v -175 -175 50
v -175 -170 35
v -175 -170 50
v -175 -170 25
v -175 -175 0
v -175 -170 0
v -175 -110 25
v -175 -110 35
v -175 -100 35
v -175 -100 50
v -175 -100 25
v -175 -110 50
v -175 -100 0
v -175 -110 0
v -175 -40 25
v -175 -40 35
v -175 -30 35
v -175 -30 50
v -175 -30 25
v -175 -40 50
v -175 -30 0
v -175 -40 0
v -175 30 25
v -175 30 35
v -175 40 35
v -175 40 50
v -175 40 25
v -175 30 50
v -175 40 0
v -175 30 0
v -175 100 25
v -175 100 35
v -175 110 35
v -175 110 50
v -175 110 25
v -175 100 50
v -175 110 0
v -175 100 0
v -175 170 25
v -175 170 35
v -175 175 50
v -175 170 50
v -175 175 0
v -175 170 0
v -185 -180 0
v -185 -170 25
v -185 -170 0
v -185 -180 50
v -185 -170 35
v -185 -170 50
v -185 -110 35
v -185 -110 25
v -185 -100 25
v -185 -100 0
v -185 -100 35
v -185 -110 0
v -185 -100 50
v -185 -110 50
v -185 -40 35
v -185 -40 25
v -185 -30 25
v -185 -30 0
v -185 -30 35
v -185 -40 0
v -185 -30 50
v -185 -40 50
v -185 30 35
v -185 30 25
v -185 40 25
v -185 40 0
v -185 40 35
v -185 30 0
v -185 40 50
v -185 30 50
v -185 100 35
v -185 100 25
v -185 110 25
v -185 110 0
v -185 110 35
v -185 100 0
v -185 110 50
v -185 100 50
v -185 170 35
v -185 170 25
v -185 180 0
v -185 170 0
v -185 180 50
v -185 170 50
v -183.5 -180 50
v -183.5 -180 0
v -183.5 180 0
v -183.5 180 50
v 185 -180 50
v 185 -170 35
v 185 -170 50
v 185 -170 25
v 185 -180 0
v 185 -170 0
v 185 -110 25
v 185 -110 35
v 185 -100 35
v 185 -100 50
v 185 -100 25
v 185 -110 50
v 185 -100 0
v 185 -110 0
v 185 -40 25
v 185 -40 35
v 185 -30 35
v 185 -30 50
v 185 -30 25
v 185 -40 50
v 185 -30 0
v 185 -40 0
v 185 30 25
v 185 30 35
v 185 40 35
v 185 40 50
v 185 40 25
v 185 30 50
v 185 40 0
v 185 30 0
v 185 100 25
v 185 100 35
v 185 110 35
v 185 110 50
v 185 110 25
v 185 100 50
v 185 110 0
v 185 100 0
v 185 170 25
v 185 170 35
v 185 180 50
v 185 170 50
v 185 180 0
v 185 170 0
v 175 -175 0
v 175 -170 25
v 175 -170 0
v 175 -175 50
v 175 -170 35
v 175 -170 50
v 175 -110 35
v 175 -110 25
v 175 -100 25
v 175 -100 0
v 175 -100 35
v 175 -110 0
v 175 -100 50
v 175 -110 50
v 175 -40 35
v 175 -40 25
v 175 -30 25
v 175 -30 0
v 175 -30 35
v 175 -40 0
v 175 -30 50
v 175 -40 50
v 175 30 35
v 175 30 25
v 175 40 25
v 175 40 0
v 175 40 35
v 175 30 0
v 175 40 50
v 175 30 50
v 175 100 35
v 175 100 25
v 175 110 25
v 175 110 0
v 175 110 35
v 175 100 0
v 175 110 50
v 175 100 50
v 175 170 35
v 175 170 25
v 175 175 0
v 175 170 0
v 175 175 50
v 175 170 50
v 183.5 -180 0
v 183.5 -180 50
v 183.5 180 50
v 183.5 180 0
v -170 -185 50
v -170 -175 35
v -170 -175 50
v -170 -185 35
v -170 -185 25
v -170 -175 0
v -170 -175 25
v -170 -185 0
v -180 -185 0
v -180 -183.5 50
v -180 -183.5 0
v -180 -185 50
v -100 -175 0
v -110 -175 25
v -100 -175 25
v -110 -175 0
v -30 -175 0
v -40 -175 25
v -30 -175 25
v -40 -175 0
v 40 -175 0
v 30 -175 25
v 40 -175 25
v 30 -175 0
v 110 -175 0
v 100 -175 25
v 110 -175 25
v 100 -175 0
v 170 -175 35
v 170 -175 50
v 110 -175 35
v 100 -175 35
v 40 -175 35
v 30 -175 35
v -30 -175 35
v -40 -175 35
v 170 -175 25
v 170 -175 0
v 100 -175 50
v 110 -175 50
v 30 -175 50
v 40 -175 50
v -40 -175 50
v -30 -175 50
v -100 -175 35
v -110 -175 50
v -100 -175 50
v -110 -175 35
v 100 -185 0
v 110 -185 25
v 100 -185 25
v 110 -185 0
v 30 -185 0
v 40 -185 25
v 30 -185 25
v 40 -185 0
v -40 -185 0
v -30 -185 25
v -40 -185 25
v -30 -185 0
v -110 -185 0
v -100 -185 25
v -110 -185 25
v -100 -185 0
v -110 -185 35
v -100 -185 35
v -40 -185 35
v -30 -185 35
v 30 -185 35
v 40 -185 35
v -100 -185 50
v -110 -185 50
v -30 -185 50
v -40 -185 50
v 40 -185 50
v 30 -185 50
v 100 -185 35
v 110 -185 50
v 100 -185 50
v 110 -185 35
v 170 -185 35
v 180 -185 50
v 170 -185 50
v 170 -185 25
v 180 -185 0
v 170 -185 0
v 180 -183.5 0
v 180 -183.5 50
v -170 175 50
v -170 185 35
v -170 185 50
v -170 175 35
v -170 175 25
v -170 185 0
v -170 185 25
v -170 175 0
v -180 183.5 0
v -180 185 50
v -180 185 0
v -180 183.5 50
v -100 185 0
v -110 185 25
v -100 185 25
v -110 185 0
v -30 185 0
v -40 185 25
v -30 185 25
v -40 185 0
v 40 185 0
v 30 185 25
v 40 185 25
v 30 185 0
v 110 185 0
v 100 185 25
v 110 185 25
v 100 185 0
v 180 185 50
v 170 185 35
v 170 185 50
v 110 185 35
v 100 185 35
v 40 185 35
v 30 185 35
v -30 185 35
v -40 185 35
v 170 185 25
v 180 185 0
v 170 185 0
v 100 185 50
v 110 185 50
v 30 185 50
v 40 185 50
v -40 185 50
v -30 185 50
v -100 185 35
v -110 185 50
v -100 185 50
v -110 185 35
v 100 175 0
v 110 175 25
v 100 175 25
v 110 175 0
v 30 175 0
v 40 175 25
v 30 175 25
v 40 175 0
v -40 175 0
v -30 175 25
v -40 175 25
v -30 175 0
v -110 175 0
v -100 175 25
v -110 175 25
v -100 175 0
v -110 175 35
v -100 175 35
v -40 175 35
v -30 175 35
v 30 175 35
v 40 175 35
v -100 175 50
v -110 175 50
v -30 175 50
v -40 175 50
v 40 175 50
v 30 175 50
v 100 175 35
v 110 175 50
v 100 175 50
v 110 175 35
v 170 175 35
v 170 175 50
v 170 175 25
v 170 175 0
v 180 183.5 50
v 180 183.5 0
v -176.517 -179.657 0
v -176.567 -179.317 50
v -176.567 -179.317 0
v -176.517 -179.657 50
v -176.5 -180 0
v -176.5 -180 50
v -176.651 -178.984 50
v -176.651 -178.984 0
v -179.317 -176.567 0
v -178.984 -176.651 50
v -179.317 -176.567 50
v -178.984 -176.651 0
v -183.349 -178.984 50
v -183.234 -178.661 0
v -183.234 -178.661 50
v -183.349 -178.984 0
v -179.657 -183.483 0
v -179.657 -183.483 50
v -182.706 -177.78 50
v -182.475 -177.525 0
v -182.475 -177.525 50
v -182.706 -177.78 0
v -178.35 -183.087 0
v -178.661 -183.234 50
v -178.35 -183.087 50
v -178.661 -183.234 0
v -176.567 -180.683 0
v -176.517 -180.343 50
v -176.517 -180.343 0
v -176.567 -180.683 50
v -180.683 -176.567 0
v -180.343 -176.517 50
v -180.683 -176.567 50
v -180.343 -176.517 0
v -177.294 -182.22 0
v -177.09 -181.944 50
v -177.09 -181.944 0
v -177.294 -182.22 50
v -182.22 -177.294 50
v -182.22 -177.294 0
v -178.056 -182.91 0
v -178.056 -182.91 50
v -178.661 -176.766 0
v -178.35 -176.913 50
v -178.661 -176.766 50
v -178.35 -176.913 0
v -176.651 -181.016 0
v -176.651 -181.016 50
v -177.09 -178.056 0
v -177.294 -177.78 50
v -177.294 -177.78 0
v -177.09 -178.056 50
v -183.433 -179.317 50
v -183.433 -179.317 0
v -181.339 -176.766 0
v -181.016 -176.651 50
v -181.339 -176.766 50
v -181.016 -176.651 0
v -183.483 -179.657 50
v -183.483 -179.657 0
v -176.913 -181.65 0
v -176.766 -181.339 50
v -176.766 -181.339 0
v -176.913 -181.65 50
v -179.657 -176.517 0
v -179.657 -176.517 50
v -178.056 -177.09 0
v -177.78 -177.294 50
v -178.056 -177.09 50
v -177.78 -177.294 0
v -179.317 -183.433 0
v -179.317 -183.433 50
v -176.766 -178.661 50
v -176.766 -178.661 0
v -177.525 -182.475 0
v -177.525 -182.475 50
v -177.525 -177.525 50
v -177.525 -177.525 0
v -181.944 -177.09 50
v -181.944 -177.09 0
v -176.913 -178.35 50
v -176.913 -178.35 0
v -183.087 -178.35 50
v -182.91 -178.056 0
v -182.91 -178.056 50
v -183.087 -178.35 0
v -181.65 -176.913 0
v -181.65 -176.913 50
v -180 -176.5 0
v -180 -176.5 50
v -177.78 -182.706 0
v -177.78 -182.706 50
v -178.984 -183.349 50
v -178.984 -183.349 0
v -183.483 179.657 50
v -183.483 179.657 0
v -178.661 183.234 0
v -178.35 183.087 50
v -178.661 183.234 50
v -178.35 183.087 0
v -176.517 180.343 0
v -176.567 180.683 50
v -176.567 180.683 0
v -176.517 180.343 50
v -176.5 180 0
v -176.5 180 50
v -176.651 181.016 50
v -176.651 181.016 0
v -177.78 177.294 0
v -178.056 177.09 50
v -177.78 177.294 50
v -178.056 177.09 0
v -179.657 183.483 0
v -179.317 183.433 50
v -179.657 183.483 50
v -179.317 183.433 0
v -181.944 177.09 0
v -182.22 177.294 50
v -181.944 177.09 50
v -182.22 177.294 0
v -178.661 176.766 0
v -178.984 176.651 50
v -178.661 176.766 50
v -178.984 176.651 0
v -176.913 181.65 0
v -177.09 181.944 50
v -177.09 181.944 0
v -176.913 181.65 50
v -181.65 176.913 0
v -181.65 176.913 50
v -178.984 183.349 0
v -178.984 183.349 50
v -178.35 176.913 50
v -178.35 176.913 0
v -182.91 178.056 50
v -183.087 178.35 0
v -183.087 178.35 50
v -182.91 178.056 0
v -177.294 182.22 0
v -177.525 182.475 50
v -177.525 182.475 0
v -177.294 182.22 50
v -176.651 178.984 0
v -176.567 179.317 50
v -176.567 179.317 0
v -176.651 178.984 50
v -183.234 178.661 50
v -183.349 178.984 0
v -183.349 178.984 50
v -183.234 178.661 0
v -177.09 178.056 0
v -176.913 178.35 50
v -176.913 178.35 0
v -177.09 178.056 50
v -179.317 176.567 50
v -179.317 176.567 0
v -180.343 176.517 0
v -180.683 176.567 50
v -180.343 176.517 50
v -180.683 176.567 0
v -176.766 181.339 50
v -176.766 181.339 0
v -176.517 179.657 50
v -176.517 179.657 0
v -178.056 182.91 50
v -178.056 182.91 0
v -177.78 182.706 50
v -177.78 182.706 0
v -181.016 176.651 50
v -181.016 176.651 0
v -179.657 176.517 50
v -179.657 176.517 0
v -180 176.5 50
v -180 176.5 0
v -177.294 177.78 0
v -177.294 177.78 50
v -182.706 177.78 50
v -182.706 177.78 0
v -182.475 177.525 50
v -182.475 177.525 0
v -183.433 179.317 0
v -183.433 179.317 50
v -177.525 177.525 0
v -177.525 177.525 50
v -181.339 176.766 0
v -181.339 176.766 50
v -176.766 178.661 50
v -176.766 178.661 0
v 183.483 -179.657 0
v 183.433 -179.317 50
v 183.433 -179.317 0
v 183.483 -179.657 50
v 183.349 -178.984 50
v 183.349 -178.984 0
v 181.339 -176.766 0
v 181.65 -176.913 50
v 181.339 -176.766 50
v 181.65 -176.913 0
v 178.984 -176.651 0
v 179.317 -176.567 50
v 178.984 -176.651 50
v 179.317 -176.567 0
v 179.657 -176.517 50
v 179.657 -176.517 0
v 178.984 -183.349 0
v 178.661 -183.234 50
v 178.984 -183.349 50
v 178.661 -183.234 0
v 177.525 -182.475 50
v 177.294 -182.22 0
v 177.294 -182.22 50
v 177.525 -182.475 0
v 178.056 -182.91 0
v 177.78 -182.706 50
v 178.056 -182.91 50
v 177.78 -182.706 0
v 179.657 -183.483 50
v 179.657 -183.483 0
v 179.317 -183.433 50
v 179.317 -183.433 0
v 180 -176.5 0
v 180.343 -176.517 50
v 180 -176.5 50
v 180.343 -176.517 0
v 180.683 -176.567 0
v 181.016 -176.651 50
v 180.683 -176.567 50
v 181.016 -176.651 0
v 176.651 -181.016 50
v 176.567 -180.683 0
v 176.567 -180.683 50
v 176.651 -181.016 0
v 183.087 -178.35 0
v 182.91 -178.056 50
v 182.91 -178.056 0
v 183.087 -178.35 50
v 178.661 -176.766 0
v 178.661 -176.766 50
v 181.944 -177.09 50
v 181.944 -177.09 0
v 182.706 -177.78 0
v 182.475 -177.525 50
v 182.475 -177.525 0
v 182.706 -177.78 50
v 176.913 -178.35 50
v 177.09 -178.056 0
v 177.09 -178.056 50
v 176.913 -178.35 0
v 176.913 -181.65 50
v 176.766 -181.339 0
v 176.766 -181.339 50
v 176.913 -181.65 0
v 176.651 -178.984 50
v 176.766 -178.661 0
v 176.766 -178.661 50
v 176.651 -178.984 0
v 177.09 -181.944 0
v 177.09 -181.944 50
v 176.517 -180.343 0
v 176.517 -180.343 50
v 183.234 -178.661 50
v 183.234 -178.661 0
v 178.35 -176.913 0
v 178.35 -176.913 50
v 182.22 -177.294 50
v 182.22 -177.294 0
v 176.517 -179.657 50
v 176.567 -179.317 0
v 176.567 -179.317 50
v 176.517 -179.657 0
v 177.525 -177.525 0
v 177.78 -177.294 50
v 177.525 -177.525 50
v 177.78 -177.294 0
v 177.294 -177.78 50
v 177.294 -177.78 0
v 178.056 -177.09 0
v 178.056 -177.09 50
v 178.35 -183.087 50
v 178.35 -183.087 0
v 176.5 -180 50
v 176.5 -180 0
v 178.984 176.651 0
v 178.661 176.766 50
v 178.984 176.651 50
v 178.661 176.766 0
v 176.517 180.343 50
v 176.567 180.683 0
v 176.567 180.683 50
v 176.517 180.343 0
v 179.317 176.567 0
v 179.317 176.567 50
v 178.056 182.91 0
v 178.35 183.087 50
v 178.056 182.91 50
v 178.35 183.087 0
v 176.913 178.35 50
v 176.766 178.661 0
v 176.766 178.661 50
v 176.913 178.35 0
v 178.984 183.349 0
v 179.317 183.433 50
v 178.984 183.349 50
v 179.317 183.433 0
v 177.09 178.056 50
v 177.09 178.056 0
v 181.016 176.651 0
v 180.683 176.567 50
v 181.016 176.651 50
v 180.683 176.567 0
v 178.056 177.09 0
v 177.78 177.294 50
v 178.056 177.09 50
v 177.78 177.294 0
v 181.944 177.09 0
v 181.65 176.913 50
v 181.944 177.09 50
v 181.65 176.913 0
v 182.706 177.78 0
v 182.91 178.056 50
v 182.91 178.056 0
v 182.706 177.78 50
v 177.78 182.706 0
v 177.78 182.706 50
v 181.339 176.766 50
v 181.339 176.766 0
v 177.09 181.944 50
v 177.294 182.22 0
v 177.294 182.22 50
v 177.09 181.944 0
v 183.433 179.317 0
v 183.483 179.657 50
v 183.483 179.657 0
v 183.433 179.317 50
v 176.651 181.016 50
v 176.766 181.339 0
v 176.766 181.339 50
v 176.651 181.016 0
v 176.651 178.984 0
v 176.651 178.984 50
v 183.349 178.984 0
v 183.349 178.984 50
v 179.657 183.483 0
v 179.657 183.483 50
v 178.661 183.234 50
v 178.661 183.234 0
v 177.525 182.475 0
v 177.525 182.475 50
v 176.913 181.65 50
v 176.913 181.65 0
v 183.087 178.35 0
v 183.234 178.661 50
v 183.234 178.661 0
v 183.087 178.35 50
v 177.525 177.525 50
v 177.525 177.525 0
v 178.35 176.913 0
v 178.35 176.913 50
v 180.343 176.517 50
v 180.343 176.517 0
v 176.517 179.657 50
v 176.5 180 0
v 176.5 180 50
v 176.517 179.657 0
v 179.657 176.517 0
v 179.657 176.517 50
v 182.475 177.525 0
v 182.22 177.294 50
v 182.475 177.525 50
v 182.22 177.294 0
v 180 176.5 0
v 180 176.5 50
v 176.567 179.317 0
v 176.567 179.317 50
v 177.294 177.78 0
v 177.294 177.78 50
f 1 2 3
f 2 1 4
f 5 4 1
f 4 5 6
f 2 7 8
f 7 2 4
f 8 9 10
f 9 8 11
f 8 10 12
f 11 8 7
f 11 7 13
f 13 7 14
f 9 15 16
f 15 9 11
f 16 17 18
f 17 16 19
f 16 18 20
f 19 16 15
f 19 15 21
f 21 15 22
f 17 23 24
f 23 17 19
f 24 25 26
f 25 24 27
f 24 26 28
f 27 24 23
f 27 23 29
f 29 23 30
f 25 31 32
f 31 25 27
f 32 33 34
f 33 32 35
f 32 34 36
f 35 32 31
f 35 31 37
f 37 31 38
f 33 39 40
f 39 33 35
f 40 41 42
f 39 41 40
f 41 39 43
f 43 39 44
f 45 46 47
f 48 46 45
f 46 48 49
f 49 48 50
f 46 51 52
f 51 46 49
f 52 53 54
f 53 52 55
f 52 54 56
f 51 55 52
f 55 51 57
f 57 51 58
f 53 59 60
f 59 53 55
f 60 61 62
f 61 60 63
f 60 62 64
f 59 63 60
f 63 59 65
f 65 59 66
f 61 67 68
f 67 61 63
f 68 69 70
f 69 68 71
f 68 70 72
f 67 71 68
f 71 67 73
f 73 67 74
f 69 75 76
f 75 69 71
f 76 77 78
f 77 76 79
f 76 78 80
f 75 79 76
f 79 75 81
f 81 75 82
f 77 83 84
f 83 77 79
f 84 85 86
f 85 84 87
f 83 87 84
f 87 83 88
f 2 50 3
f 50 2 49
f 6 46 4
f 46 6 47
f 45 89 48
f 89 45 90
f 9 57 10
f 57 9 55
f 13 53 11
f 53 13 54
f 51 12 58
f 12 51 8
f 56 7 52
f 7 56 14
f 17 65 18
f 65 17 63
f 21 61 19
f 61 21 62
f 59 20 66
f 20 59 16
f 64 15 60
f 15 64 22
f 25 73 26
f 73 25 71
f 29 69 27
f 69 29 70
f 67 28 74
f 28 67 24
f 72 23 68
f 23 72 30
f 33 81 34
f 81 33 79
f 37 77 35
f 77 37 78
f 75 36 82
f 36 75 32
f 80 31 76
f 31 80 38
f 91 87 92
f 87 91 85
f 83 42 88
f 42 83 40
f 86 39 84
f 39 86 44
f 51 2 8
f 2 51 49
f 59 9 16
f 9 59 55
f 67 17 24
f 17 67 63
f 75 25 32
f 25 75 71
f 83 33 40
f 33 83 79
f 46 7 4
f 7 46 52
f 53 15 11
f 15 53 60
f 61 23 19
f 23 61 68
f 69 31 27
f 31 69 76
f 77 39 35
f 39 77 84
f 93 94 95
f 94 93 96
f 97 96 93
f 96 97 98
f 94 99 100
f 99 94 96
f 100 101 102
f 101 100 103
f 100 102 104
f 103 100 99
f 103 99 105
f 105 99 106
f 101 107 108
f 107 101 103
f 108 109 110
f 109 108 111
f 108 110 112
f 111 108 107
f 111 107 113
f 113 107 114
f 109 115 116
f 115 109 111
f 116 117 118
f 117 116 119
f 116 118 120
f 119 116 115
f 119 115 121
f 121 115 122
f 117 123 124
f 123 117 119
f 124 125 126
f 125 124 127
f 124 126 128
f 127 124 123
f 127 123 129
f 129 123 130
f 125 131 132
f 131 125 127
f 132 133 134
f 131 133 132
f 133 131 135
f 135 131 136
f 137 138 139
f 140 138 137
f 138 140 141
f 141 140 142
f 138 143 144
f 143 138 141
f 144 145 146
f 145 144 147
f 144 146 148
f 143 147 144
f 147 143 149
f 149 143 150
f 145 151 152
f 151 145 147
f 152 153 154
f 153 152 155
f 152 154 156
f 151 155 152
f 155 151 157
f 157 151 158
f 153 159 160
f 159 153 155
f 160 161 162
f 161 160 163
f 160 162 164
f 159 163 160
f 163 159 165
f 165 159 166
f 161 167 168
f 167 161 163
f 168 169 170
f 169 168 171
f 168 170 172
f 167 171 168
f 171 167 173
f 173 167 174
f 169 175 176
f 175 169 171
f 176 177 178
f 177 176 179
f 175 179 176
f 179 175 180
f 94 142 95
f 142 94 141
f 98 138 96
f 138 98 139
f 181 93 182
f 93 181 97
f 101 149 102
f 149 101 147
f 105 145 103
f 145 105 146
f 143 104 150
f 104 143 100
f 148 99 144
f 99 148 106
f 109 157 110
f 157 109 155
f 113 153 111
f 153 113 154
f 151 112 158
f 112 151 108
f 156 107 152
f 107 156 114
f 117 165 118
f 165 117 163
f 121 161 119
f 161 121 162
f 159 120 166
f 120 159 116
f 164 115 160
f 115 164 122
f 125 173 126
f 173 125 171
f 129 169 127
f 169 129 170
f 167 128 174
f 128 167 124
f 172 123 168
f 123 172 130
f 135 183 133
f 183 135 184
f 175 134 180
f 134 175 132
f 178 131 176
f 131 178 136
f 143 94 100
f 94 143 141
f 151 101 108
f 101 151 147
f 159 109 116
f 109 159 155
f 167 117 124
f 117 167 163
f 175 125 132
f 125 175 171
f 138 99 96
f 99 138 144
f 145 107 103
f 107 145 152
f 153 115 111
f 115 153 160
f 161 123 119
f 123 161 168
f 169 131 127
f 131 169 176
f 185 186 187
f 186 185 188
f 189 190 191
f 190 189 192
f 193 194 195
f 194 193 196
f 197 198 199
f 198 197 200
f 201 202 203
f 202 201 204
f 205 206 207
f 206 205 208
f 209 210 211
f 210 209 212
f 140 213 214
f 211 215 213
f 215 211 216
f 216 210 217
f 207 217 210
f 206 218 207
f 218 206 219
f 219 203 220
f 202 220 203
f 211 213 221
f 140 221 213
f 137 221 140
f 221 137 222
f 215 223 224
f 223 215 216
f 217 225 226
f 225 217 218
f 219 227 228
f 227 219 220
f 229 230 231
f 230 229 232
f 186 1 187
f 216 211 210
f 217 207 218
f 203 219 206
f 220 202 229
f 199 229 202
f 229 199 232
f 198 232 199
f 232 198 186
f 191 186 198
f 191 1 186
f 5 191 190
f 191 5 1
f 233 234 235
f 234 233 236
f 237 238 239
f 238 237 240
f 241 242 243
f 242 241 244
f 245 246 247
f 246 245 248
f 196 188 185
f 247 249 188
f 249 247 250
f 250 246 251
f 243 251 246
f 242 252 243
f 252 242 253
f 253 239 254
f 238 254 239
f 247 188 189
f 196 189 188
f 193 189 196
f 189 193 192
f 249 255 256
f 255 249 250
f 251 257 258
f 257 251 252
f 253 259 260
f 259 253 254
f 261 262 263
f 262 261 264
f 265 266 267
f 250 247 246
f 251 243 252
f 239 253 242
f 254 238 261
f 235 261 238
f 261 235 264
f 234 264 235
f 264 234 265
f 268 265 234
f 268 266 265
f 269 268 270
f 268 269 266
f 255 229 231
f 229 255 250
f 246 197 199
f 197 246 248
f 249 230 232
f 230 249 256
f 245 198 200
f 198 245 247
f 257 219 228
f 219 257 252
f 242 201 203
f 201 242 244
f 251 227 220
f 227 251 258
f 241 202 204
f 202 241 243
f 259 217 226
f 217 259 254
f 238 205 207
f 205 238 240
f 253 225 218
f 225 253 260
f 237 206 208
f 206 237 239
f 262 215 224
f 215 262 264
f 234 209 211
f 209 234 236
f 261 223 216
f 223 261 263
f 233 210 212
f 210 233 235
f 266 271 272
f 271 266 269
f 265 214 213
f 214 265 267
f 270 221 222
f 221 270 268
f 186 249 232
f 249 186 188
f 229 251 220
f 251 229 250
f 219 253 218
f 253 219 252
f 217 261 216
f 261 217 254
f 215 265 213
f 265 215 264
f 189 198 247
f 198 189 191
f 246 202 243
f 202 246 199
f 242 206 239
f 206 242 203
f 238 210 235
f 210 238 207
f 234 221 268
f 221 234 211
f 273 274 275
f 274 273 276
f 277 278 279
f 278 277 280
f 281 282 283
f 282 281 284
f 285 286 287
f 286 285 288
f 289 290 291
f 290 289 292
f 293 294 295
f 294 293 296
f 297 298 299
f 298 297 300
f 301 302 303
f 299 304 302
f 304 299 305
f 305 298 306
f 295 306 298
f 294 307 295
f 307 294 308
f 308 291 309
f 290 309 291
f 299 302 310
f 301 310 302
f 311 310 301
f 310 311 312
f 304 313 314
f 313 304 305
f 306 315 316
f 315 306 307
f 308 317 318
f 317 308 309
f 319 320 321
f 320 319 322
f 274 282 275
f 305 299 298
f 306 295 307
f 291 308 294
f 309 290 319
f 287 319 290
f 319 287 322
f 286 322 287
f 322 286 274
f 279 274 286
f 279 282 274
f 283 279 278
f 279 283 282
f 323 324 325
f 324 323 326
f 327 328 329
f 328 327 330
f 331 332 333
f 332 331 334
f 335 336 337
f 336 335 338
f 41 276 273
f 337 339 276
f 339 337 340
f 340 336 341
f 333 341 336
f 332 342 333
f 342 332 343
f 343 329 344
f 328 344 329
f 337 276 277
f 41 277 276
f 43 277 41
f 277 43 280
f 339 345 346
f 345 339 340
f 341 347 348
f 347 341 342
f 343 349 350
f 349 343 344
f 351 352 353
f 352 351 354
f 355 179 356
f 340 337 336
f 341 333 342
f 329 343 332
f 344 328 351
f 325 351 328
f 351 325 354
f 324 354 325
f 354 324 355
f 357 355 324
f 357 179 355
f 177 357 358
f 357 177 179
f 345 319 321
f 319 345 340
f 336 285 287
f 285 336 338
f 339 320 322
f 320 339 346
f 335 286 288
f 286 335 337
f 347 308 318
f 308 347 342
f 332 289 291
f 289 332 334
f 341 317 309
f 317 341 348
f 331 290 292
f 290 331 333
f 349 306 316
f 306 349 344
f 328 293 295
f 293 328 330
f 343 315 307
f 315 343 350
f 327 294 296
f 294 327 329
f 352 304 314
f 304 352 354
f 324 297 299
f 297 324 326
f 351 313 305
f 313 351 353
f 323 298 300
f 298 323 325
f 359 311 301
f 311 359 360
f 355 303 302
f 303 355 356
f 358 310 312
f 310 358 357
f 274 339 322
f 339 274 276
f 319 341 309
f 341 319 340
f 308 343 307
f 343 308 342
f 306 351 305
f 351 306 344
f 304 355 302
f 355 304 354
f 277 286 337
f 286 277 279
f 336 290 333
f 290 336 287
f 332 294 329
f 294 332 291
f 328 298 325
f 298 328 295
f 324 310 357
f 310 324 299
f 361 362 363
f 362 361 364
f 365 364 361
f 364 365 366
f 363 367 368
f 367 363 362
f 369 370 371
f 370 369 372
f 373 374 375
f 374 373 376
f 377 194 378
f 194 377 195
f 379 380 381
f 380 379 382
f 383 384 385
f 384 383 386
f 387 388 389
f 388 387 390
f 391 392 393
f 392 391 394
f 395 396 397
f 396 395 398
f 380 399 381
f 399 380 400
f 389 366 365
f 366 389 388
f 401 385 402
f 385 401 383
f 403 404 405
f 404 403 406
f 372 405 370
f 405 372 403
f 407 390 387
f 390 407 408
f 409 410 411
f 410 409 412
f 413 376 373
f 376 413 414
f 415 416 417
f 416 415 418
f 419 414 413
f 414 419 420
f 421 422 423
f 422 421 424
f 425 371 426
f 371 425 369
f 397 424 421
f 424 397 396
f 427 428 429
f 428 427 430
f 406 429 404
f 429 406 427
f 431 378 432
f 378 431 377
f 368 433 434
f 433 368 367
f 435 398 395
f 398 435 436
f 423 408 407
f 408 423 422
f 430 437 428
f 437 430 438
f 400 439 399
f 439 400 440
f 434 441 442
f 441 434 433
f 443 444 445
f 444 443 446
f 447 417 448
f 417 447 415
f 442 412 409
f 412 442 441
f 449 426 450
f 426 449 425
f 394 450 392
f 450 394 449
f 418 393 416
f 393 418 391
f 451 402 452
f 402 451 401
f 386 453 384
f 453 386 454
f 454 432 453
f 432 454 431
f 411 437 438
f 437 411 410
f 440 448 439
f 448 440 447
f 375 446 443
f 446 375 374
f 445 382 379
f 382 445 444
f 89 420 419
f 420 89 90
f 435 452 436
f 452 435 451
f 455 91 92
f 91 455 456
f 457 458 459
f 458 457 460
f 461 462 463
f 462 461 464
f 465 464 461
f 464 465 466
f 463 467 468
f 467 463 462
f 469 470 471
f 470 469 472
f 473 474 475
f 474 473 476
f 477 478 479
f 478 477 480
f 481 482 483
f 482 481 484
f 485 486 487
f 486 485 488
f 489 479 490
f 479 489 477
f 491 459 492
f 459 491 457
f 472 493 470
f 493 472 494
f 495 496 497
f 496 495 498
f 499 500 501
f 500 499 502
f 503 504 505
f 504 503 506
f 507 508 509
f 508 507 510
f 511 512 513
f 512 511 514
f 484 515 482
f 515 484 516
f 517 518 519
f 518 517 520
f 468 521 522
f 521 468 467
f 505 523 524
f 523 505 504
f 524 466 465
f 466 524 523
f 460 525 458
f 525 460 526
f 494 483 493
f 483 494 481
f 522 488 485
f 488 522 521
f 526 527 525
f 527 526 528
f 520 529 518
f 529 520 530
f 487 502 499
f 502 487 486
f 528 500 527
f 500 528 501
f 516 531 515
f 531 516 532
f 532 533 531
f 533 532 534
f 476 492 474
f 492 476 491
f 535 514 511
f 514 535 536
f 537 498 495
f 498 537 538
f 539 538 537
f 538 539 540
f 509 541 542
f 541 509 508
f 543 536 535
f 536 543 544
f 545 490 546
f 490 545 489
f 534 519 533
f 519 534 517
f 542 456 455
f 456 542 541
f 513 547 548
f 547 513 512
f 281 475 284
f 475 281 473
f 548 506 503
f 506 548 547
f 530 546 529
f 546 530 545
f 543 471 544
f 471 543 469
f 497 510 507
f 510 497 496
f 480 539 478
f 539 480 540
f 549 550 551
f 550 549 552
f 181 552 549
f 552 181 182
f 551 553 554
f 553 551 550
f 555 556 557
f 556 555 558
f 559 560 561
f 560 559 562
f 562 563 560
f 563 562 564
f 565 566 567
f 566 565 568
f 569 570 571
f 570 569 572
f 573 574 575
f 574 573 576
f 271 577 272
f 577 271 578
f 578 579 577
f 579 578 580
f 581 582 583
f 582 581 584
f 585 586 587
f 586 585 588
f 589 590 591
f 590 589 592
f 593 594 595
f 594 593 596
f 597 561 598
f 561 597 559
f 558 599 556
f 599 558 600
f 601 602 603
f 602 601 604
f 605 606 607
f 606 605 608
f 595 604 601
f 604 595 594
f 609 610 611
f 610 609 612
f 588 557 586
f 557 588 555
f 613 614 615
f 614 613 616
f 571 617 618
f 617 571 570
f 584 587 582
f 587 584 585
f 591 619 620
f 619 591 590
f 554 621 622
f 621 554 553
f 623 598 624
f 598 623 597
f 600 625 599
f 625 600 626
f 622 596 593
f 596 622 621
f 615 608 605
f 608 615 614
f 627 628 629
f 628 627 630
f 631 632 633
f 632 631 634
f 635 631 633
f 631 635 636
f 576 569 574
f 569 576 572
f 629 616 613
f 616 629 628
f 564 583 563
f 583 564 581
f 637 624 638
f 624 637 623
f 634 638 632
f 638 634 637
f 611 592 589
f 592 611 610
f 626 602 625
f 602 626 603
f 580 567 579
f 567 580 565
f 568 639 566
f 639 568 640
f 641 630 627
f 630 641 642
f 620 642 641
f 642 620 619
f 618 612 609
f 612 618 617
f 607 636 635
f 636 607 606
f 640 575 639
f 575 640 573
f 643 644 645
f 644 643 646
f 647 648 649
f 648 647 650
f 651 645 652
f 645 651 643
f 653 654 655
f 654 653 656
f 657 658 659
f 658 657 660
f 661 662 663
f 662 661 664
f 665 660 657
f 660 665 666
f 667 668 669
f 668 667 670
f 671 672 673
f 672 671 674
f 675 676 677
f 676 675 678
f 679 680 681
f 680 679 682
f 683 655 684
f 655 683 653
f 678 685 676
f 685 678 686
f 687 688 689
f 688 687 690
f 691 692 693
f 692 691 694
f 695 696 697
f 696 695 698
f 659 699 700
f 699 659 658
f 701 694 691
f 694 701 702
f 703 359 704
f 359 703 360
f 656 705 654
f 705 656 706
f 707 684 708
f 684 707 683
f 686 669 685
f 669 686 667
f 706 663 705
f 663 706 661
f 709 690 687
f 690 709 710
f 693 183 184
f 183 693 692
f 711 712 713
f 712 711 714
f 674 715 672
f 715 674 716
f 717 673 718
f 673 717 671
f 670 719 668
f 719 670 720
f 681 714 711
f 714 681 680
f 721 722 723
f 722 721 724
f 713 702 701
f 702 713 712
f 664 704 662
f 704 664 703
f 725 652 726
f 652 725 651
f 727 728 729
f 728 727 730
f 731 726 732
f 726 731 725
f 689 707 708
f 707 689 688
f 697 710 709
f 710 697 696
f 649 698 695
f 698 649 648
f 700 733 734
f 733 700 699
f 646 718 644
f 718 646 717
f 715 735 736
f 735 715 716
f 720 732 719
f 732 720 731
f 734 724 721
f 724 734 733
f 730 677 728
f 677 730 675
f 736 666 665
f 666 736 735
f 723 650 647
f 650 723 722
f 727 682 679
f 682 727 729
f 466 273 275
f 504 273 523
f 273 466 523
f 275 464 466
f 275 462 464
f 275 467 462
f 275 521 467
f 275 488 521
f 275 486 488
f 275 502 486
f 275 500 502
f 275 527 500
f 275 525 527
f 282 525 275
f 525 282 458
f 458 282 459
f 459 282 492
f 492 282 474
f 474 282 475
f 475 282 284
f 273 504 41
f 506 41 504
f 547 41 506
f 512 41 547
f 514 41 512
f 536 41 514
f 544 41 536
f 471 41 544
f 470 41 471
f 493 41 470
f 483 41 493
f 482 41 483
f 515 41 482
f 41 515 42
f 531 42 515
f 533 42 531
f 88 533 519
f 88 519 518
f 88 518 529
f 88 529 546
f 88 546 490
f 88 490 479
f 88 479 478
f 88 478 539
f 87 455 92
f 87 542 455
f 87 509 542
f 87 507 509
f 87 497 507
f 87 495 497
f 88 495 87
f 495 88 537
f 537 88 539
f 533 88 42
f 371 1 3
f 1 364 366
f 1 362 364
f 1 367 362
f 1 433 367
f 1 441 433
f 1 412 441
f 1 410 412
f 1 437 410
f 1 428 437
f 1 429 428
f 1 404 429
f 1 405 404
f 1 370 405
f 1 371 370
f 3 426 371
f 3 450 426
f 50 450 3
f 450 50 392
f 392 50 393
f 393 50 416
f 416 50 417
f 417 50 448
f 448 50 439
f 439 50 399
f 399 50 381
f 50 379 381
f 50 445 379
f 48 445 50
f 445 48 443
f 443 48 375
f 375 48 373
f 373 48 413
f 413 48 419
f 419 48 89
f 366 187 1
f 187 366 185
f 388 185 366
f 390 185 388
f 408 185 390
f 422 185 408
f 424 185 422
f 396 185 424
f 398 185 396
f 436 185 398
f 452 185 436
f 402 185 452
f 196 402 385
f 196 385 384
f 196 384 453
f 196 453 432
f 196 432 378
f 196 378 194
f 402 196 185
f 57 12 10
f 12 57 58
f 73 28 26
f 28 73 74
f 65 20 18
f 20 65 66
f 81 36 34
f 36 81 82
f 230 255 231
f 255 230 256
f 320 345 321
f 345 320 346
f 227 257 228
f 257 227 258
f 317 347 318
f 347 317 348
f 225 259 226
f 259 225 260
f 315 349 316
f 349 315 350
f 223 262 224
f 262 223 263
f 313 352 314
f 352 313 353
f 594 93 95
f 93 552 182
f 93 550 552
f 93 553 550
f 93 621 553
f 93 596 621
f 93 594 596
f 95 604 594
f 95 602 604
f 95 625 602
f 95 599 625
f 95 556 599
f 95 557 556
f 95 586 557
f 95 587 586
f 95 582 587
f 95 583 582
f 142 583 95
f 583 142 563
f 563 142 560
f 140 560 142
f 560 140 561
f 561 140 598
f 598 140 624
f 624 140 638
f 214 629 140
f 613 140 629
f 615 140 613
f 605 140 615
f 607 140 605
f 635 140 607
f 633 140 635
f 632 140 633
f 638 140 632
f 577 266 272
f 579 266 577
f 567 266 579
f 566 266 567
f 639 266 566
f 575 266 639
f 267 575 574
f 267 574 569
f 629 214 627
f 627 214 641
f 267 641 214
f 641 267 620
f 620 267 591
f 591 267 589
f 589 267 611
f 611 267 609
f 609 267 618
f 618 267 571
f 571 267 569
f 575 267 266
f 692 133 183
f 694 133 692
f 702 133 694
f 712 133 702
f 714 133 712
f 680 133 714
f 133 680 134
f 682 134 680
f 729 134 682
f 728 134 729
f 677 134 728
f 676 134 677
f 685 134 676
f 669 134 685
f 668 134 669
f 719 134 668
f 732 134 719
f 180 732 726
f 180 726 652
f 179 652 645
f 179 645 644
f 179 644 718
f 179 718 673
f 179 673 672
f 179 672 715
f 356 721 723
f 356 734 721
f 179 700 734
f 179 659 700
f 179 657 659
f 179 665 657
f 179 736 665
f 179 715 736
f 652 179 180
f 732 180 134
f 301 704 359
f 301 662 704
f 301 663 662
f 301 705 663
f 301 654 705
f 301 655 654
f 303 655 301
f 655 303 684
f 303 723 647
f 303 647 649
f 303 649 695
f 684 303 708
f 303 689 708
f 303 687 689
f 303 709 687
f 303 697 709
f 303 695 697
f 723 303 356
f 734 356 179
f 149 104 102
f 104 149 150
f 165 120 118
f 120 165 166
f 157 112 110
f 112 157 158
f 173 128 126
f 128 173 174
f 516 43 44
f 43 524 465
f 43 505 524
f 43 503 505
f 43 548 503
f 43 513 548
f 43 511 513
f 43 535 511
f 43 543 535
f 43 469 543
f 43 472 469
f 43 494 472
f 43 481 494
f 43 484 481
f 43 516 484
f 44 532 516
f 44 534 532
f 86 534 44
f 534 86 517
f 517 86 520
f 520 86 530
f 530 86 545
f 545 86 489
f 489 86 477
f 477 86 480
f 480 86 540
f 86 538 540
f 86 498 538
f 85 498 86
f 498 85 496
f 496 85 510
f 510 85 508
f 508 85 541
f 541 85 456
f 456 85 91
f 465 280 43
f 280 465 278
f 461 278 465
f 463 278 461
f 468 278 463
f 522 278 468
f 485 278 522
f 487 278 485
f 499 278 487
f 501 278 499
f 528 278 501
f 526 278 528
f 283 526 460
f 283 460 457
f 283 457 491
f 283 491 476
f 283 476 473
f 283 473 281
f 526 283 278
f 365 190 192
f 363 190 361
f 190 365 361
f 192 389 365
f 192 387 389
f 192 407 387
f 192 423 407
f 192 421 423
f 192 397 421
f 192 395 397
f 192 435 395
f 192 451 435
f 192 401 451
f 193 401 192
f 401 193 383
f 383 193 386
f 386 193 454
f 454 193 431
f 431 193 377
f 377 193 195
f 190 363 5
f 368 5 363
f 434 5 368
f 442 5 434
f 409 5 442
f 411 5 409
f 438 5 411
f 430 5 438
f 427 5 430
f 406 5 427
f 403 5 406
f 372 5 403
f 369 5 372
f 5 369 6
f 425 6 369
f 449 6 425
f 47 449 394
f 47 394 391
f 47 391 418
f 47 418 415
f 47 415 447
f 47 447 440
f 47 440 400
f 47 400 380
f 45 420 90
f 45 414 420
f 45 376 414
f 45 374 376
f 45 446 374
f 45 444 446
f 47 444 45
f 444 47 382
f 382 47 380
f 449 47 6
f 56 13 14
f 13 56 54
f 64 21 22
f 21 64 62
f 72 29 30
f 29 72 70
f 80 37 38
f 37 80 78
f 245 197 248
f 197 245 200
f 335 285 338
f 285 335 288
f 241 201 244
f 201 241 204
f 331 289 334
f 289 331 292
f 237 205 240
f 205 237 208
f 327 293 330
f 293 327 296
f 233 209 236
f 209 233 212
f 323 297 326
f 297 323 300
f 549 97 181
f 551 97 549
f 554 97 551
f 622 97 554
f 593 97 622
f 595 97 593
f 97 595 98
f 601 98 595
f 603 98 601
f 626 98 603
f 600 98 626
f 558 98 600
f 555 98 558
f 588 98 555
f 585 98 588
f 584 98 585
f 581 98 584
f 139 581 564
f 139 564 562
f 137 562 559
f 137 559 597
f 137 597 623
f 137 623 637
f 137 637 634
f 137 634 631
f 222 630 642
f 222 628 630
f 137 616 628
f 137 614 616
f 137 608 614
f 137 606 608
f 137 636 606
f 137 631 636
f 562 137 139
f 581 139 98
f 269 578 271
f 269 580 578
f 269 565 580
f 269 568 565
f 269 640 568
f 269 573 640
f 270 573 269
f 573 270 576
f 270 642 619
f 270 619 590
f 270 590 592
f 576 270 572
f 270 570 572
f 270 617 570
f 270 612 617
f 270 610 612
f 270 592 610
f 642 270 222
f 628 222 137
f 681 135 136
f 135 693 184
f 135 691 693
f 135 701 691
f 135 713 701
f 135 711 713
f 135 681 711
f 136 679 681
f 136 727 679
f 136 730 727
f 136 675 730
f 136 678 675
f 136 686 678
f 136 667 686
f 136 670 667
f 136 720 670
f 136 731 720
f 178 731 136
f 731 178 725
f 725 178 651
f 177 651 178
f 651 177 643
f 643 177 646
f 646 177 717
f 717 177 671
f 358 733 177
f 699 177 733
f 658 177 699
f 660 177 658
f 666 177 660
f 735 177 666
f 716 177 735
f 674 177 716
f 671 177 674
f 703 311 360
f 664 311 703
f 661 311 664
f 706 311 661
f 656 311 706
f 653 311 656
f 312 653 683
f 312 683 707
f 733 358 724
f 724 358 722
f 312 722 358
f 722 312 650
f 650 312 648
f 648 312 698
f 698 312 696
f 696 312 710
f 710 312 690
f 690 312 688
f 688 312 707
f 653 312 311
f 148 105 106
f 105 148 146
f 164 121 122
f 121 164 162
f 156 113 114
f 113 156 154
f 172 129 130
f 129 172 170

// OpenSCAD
/*
  Cage slice 09 of 15
*/

bar = 10;
half_inner = 175;
gap = 70;
rod_d = 7;
half_outer = half_inner + bar;

function grid_pos(n) = -half_inner + n * gap;

module cage_full() {
  difference() {
    union() {
      // Floor grid at z = -10 .. 0
      for (j = [0:5]) {
        y = grid_pos(j);
        translate([-half_inner, y - bar/2, -bar])
          cube([2*half_inner, bar, bar], center=false);
      }
      for (i = [0:5]) {
        x = grid_pos(i);
        translate([x - bar/2, -half_inner, -bar])
          cube([bar, 2*half_inner, bar], center=false);
      }

      // Roof grid at z = 700 .. 710
      for (j = [0:5]) {
        y = grid_pos(j);
        translate([-half_inner, y - bar/2, 700])
          cube([2*half_inner, bar, bar], center=false);
      }
      for (i = [0:5]) {
        x = grid_pos(i);
        translate([x - bar/2, -half_inner, 700])
          cube([bar, 2*half_inner, bar], center=false);
      }

      // Side walls at x = ±175
      for (side = [-1, 1]) {
        sx = side * half_inner;
        x0 = (side == 1) ? sx : sx - bar;
        for (j = [0:5]) {
          y = grid_pos(j);
          translate([x0, y - bar/2, 0])
            cube([bar, bar, 700], center=false);
        }
        for (k = [0:10]) {
          zc = 0 + k * gap;
          translate([x0, -half_inner, zc - bar/2])
            cube([bar, 2*half_inner, bar], center=false);
        }
      }

      // Front/back walls at y = ±175
      for (side = [-1, 1]) {
        sy = side * half_inner;
        y0 = (side == 1) ? sy : sy - bar;
        for (i = [0:5]) {
          x = grid_pos(i);
          translate([x - bar/2, y0, 0])
            cube([bar, bar, 700], center=false);
        }
        for (k = [0:10]) {
          zc = 0 + k * gap;
          translate([-half_inner, y0, zc - bar/2])
            cube([2*half_inner, bar, bar], center=false);
        }
      }
    }

    for (sx = [-1, 1], sy = [-1, 1]) {
      translate([sx * (half_inner + bar/2),
                 sy * (half_inner + bar/2),
                 -20])
        cylinder(d = rod_d, h = 740, $fn = 64);
    }
  }
}

z_min = 390;
z_max = 440;  // height 50 mm

module slice() {
  intersection() {
    cage_full();
    translate([-half_outer - 5, -half_outer - 5, z_min])
      cube([2*(half_outer + 5), 2*(half_outer + 5), z_max - z_min], center=false);
  }
}

translate([0, 0, -z_min])
  slice();
